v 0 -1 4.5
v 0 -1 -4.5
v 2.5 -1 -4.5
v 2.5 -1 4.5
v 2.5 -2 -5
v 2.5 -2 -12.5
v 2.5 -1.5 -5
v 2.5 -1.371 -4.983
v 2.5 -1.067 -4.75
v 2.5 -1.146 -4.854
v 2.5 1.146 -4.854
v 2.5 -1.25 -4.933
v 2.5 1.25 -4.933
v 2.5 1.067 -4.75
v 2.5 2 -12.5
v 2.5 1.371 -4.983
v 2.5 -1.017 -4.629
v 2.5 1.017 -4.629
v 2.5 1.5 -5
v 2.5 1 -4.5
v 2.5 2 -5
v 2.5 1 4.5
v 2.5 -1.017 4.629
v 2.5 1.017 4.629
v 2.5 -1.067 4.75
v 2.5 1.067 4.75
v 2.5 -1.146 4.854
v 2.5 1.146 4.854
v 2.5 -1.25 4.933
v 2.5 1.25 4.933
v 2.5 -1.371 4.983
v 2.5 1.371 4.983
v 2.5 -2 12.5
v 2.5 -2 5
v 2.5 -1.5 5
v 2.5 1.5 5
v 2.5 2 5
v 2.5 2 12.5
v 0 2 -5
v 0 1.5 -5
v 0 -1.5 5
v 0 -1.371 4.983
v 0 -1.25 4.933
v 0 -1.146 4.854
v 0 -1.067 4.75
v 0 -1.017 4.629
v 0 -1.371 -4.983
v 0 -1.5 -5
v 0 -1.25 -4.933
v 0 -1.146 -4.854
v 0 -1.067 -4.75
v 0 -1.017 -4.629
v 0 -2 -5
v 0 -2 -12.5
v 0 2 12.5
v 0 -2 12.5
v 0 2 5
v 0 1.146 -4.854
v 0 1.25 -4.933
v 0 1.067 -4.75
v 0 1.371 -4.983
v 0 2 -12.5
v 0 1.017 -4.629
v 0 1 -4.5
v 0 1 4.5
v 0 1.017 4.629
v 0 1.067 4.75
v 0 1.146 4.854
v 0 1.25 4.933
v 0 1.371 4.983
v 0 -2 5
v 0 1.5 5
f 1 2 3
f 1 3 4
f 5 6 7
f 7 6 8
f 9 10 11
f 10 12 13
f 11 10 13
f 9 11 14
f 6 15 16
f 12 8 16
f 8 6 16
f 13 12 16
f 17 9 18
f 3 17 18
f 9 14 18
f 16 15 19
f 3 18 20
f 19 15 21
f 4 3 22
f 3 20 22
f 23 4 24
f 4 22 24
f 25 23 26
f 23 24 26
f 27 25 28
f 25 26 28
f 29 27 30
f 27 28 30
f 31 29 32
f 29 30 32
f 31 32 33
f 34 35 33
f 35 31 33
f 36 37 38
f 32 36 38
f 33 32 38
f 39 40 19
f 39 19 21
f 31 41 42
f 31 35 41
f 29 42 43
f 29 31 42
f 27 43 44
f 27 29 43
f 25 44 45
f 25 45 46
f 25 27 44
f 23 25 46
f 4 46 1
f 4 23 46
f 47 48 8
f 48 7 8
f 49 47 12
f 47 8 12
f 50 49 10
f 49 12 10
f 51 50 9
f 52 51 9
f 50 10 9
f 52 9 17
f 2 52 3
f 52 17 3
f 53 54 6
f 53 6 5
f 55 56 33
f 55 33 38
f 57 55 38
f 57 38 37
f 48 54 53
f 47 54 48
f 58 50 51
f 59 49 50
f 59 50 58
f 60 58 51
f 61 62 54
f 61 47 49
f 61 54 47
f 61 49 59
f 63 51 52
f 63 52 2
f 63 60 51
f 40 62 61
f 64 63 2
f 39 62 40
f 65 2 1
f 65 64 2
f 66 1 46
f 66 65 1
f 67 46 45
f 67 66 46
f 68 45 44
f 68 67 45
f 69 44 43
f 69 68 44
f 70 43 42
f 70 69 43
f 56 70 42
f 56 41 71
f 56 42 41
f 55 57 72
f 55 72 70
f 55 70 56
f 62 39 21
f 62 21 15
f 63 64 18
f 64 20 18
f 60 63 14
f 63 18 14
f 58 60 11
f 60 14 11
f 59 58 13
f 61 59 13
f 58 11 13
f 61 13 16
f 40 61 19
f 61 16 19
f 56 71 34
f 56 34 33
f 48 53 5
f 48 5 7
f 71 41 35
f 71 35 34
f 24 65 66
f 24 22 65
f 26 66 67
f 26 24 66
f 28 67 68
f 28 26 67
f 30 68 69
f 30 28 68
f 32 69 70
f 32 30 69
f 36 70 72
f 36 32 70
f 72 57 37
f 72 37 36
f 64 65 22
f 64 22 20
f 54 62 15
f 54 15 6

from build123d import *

# Parameters (mm, degrees)
EXTRUDE_1_DEPTH = 2.5
FILLET_1_R      = 0.5
FILLET_2_R      = 0.5
FILLET_3_R      = 0.5
FILLET_4_R      = 0.5


with BuildPart() as part:
    # 草图1 → 凸台-拉伸1 (new body)
    with BuildSketch(Plane(origin=(0, 0, 0), x_dir=(0, 0, -1), z_dir=(1, 0, 0))):
        Polygon((-5, 1), (5, 1), (5, 2), (12.5, 2), (12.5, -2), (5, -2), (5, -1), (-5, -1), (-5, -2), (-12.5, -2), (-12.5, 2), (-5, 2), align=None)
    extrude(amount=EXTRUDE_1_DEPTH)

    # 圆角1
    fillet_1_edges = [part.edges().sort_by_distance(p)[0] for p in [
        (1.25, 1, -5),
    ]]
    fillet(fillet_1_edges, radius=FILLET_1_R)

    # 圆角2
    fillet_2_edges = [part.edges().sort_by_distance(p)[0] for p in [
        (1.25, -1, -5),
    ]]
    fillet(fillet_2_edges, radius=FILLET_2_R)

    # 圆角3
    fillet_3_edges = [part.edges().sort_by_distance(p)[0] for p in [
        (1.25, 1, 5),
    ]]
    fillet(fillet_3_edges, radius=FILLET_3_R)

    # 圆角4
    fillet_4_edges = [part.edges().sort_by_distance(p)[0] for p in [
        (1.25, -1, 5),
    ]]
    fillet(fillet_4_edges, radius=FILLET_4_R)


solid = part.part
